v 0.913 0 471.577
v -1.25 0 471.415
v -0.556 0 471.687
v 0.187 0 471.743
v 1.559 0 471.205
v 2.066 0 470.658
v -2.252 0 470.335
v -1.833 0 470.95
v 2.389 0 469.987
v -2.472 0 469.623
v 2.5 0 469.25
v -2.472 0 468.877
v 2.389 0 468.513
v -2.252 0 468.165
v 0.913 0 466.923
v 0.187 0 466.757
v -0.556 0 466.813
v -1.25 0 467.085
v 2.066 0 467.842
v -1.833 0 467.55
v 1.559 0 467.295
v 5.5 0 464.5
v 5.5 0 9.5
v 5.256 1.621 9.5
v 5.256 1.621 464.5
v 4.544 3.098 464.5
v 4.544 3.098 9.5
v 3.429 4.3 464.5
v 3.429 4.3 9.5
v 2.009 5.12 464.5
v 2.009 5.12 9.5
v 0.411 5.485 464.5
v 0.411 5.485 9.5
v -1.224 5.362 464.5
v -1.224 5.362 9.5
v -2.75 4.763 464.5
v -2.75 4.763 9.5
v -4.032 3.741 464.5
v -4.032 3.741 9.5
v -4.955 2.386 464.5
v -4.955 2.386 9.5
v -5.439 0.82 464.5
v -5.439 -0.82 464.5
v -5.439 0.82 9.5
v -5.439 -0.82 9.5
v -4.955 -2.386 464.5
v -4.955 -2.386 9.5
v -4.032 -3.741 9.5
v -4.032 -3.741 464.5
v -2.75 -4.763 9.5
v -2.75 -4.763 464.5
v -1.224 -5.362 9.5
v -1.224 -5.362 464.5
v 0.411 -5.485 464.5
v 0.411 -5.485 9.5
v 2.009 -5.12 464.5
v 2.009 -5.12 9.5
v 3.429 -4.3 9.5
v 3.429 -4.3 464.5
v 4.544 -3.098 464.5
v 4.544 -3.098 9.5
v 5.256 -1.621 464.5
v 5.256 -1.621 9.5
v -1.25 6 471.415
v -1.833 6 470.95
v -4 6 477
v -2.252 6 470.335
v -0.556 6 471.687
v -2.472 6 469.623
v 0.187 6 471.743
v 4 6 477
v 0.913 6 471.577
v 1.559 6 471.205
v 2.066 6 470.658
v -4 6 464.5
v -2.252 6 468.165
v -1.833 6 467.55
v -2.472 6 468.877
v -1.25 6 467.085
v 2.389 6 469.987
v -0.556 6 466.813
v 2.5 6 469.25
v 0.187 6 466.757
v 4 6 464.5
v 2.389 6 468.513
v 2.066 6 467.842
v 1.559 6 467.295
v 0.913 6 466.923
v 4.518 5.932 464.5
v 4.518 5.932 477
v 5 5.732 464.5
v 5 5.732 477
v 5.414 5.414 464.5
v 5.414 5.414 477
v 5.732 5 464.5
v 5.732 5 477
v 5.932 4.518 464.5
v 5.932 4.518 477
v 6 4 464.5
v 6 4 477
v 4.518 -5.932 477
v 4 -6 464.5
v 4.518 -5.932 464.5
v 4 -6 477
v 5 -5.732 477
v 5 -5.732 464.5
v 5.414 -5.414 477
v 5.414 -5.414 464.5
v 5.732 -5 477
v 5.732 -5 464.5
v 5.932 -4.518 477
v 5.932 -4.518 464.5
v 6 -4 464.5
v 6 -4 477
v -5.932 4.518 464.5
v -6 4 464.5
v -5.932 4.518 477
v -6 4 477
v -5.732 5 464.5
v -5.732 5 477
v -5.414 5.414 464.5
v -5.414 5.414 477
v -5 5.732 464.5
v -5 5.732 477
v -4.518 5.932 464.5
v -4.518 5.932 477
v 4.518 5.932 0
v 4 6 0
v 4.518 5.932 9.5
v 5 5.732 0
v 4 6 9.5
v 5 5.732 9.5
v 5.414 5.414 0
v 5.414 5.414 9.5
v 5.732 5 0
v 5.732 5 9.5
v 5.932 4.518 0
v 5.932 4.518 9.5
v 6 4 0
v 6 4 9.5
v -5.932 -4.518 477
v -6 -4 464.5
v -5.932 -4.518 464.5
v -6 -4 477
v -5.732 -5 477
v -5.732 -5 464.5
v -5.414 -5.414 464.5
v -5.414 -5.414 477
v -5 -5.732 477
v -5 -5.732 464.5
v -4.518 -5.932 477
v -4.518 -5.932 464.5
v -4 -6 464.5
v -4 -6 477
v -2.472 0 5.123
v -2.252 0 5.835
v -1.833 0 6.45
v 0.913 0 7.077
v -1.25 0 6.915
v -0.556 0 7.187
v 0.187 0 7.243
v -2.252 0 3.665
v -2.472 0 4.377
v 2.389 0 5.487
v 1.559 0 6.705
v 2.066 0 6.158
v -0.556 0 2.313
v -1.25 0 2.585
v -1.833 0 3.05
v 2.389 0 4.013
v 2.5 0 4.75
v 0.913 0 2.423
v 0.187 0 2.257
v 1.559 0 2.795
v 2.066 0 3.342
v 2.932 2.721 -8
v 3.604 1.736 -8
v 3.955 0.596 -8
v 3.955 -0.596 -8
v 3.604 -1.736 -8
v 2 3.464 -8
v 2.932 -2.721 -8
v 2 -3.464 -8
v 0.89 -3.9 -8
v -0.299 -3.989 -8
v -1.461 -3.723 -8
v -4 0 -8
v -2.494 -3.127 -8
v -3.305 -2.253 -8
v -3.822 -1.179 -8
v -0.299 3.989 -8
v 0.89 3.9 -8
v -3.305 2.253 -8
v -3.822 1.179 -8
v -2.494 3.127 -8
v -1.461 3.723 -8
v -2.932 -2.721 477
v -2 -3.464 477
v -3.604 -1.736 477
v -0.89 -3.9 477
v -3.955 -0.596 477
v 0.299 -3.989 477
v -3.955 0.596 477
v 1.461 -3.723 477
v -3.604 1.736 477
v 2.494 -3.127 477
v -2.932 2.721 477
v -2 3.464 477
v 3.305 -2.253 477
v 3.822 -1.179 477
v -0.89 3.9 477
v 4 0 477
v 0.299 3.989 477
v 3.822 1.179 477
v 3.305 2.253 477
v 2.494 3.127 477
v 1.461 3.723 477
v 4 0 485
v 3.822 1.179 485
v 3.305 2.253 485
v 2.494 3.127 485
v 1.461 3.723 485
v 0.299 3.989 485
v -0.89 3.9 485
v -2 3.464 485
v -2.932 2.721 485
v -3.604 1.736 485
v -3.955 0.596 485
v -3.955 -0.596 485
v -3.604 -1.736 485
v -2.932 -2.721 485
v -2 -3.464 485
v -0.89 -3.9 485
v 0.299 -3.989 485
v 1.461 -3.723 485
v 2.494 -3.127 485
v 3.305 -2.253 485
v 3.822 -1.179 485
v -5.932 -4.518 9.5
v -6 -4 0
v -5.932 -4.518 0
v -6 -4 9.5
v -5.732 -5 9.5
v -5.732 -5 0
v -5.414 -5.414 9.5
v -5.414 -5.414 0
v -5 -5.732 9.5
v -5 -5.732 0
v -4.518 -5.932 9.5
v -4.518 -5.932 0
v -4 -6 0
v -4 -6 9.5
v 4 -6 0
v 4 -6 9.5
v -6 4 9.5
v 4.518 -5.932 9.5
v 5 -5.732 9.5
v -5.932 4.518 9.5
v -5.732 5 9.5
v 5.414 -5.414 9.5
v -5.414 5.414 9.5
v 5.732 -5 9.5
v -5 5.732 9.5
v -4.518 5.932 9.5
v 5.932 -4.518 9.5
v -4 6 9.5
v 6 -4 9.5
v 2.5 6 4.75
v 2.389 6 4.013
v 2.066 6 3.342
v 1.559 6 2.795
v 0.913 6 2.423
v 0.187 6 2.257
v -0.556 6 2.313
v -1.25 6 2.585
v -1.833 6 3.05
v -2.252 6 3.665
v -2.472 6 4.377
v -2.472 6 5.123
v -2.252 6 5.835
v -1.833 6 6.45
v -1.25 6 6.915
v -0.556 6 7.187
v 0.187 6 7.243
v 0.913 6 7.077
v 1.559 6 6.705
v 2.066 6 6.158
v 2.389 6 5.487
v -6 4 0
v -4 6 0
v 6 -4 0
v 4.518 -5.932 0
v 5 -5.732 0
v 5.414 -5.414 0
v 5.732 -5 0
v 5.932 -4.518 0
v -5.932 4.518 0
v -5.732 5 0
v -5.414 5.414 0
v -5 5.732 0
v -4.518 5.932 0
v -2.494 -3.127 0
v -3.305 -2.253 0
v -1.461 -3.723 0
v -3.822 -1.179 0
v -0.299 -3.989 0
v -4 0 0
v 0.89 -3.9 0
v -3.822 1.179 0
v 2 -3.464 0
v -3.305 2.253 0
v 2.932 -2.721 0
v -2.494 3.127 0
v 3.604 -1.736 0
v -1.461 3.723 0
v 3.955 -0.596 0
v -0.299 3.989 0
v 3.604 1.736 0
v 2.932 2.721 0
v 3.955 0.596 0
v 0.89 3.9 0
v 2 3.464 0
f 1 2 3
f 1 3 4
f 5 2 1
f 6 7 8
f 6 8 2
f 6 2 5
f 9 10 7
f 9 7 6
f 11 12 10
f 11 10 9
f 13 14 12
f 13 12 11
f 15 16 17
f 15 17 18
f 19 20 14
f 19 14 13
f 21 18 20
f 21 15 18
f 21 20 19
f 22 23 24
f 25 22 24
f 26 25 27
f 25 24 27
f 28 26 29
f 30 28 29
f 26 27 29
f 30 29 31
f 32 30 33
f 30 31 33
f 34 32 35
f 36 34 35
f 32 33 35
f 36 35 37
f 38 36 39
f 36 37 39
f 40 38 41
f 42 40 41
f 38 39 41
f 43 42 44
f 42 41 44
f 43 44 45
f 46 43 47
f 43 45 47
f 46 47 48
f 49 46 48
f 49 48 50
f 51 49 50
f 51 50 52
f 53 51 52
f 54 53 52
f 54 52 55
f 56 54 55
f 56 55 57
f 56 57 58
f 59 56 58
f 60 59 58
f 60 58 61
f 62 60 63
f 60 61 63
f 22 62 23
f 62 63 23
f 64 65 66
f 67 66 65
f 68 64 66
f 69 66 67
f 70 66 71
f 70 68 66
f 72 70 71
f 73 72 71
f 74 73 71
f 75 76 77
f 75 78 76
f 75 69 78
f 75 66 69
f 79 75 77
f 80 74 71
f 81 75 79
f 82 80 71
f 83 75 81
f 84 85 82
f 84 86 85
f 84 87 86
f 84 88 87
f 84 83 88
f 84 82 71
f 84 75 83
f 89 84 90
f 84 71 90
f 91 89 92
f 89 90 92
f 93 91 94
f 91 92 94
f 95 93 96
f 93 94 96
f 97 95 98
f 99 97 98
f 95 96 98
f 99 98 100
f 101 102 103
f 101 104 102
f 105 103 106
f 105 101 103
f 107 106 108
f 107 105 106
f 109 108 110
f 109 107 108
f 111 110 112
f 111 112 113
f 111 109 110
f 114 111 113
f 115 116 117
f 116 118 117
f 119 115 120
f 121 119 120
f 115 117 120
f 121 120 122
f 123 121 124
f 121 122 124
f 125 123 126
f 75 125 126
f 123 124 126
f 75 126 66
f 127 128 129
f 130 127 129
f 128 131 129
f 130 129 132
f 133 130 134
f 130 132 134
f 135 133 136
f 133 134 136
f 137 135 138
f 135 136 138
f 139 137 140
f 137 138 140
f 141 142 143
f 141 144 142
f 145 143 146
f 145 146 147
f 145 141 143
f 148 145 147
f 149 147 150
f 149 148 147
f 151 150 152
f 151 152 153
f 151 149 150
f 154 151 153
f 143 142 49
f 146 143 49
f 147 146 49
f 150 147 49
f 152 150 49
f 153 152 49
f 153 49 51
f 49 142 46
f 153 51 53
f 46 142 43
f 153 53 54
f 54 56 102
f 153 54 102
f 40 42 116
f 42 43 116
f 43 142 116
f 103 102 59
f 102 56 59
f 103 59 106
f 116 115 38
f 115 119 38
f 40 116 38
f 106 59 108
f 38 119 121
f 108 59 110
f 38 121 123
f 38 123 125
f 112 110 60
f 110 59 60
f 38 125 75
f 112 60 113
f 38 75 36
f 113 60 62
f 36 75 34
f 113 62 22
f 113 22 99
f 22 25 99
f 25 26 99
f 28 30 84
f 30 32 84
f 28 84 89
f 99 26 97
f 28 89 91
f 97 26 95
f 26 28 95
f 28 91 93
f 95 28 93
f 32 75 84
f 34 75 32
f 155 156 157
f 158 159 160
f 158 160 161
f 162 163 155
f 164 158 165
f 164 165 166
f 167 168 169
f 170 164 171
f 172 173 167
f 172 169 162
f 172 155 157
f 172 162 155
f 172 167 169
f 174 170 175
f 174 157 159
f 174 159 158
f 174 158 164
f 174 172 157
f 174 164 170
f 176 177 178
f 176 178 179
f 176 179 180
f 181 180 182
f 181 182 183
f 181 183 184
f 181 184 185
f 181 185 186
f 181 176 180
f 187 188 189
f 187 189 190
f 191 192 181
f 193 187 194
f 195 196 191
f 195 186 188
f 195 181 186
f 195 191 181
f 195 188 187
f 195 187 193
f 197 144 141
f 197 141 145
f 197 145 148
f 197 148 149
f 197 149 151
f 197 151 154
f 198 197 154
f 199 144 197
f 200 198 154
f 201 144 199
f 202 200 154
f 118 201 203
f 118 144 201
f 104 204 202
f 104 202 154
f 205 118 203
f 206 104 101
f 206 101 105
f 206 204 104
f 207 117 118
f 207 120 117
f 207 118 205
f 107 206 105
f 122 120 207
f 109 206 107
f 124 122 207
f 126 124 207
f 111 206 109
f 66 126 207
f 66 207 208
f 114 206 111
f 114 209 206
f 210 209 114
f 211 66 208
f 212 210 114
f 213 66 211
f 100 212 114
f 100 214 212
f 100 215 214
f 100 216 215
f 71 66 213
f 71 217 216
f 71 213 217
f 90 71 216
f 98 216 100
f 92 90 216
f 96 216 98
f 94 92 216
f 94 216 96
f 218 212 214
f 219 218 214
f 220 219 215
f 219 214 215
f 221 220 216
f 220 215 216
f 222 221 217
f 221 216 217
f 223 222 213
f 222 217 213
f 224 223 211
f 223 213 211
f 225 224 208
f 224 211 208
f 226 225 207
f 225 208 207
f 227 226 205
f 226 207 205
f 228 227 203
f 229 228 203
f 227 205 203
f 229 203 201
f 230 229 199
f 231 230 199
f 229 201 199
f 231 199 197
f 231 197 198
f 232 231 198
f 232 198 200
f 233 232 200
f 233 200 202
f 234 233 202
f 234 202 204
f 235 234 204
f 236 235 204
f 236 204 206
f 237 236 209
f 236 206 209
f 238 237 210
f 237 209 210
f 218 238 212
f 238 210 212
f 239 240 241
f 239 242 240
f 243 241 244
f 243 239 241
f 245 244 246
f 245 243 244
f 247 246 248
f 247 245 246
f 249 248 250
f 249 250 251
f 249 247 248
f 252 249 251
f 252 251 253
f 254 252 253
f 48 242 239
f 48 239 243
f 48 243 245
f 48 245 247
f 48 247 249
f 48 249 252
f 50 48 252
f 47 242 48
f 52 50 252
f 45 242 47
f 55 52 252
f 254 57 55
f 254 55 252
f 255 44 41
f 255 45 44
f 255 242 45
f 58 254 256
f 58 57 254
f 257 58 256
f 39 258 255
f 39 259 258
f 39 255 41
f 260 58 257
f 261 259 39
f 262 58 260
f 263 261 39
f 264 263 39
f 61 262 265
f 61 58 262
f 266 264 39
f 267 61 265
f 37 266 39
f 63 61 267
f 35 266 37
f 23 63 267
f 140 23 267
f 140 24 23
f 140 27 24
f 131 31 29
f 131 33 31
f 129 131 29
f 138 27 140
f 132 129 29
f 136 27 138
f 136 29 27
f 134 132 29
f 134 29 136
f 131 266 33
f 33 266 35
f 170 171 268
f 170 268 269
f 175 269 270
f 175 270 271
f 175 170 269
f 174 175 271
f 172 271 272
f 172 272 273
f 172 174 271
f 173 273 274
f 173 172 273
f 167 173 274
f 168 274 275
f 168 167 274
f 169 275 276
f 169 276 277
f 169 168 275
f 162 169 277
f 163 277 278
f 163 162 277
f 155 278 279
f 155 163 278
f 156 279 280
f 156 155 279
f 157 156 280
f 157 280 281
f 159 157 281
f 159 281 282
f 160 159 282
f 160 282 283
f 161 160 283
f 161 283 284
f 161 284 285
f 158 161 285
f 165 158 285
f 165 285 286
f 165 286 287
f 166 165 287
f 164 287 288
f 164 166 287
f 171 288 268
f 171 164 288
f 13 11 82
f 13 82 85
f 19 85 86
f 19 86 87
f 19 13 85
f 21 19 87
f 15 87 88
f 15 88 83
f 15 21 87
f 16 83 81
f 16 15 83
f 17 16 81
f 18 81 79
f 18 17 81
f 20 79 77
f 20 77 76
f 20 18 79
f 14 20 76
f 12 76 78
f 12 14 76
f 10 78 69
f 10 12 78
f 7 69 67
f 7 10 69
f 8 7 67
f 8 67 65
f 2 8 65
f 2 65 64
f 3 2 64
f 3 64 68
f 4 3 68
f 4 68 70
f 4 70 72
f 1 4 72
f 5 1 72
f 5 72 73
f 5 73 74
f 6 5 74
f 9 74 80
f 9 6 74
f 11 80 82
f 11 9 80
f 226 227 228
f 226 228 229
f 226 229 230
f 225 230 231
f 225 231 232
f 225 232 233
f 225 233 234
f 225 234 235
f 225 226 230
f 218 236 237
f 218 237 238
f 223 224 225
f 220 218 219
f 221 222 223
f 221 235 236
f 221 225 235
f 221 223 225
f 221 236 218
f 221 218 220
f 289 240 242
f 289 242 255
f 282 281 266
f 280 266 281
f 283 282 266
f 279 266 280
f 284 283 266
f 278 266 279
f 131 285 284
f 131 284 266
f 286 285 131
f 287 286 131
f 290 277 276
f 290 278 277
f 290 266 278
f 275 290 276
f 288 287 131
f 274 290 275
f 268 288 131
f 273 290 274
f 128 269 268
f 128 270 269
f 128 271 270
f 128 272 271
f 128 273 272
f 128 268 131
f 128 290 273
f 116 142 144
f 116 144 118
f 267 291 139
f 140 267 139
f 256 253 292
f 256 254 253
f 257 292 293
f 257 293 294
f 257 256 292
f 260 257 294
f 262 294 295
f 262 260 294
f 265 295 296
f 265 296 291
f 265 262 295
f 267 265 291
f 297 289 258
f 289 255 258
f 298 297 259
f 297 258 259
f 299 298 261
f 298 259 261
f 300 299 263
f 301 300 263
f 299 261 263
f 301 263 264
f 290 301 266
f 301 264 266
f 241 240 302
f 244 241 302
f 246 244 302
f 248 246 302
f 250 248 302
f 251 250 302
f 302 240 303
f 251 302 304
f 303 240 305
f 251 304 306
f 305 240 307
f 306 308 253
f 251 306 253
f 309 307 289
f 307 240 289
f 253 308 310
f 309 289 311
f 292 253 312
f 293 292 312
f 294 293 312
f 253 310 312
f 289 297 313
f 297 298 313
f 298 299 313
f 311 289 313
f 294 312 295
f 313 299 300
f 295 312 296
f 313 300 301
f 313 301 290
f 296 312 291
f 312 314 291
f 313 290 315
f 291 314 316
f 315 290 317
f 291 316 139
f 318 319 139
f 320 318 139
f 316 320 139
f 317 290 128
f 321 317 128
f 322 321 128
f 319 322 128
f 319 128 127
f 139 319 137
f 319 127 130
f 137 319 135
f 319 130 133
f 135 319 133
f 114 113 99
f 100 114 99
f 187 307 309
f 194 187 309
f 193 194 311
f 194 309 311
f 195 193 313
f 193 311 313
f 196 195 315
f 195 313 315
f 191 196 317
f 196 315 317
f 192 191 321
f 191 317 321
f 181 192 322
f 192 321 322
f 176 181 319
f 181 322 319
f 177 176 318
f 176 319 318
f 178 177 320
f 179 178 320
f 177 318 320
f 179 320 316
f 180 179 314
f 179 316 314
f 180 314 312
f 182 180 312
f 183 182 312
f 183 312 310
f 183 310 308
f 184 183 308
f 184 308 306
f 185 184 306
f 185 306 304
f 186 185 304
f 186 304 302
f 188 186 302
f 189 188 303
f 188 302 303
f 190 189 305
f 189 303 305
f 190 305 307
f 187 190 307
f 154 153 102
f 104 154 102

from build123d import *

# Parameters (mm, degrees)
SKETCH_1_W          = 12
SKETCH_1_H          = 12
EXTRUDE_1_DEPTH     = 9.5
SKETCH_2_R          = 5.5
EXTRUDE_2_DEPTH     = 455
SKETCH_3_W          = 12
SKETCH_3_H          = 12
EXTRUDE_3_DEPTH     = 12.5
SKETCH_4_R          = 4
EXTRUDE_4_DEPTH     = 8
CUT_EXTRUDE_START   = -6
SKETCH_6_R          = 2.5
CUT_EXTRUDE_2_DEPTH = 6
FILLET_1_R          = 2
SKETCH_7_R          = 4
EXTRUDE_5_DEPTH     = 8


with BuildPart() as part:
    # 草图1 → 凸台-拉伸1 (new body)
    with BuildSketch(Plane.XY):
        Rectangle(SKETCH_1_W, SKETCH_1_H)
    extrude(amount=EXTRUDE_1_DEPTH)

    # 草图2 → 凸台-拉伸2 (add)
    with BuildSketch(Plane.XY.offset(9.5)):
        Circle(SKETCH_2_R)
    extrude(amount=EXTRUDE_2_DEPTH)

    # 草图3 → 凸台-拉伸3 (add)
    with BuildSketch(Plane.XY.offset(464.5)):
        Rectangle(SKETCH_3_W, SKETCH_3_H)
    extrude(amount=EXTRUDE_3_DEPTH)

    # 草图4 → 凸台-拉伸4 (add)
    with BuildSketch(Plane.XY.offset(477)):
        Circle(SKETCH_4_R)
    extrude(amount=EXTRUDE_4_DEPTH)

    # 草图6 → 切除-拉伸2 (cut)
    with BuildSketch(Plane(origin=(0, 6, 0), x_dir=(1, 0, 0), z_dir=(0, 1, 0)).offset(CUT_EXTRUDE_START)):
        with Locations((0, -4.75)):
            Circle(SKETCH_6_R)
        with Locations((0, -469.25)):
            Circle(SKETCH_6_R)
    extrude(amount=CUT_EXTRUDE_2_DEPTH, mode=Mode.SUBTRACT)

    # 圆角1
    fillet_1_edges = [part.edges().sort_by_distance(p)[0] for p in [
        (6, -6, 470.75),
        (6, 6, 470.75),
        (-6, 6, 470.75),
        (-6, -6, 470.75),
        (6, -6, 4.75),
        (-6, -6, 4.75),
        (-6, 6, 4.75),
        (6, 6, 4.75),
    ]]
    fillet(fillet_1_edges, radius=FILLET_1_R)

    # 草图7 → 凸台-拉伸5 (add)
    with BuildSketch(Plane(origin=(0, 0, 0), x_dir=(-1, 0, 0), z_dir=(0, 0, -1))):
        Circle(SKETCH_7_R)
    extrude(amount=EXTRUDE_5_DEPTH)


solid = part.part
